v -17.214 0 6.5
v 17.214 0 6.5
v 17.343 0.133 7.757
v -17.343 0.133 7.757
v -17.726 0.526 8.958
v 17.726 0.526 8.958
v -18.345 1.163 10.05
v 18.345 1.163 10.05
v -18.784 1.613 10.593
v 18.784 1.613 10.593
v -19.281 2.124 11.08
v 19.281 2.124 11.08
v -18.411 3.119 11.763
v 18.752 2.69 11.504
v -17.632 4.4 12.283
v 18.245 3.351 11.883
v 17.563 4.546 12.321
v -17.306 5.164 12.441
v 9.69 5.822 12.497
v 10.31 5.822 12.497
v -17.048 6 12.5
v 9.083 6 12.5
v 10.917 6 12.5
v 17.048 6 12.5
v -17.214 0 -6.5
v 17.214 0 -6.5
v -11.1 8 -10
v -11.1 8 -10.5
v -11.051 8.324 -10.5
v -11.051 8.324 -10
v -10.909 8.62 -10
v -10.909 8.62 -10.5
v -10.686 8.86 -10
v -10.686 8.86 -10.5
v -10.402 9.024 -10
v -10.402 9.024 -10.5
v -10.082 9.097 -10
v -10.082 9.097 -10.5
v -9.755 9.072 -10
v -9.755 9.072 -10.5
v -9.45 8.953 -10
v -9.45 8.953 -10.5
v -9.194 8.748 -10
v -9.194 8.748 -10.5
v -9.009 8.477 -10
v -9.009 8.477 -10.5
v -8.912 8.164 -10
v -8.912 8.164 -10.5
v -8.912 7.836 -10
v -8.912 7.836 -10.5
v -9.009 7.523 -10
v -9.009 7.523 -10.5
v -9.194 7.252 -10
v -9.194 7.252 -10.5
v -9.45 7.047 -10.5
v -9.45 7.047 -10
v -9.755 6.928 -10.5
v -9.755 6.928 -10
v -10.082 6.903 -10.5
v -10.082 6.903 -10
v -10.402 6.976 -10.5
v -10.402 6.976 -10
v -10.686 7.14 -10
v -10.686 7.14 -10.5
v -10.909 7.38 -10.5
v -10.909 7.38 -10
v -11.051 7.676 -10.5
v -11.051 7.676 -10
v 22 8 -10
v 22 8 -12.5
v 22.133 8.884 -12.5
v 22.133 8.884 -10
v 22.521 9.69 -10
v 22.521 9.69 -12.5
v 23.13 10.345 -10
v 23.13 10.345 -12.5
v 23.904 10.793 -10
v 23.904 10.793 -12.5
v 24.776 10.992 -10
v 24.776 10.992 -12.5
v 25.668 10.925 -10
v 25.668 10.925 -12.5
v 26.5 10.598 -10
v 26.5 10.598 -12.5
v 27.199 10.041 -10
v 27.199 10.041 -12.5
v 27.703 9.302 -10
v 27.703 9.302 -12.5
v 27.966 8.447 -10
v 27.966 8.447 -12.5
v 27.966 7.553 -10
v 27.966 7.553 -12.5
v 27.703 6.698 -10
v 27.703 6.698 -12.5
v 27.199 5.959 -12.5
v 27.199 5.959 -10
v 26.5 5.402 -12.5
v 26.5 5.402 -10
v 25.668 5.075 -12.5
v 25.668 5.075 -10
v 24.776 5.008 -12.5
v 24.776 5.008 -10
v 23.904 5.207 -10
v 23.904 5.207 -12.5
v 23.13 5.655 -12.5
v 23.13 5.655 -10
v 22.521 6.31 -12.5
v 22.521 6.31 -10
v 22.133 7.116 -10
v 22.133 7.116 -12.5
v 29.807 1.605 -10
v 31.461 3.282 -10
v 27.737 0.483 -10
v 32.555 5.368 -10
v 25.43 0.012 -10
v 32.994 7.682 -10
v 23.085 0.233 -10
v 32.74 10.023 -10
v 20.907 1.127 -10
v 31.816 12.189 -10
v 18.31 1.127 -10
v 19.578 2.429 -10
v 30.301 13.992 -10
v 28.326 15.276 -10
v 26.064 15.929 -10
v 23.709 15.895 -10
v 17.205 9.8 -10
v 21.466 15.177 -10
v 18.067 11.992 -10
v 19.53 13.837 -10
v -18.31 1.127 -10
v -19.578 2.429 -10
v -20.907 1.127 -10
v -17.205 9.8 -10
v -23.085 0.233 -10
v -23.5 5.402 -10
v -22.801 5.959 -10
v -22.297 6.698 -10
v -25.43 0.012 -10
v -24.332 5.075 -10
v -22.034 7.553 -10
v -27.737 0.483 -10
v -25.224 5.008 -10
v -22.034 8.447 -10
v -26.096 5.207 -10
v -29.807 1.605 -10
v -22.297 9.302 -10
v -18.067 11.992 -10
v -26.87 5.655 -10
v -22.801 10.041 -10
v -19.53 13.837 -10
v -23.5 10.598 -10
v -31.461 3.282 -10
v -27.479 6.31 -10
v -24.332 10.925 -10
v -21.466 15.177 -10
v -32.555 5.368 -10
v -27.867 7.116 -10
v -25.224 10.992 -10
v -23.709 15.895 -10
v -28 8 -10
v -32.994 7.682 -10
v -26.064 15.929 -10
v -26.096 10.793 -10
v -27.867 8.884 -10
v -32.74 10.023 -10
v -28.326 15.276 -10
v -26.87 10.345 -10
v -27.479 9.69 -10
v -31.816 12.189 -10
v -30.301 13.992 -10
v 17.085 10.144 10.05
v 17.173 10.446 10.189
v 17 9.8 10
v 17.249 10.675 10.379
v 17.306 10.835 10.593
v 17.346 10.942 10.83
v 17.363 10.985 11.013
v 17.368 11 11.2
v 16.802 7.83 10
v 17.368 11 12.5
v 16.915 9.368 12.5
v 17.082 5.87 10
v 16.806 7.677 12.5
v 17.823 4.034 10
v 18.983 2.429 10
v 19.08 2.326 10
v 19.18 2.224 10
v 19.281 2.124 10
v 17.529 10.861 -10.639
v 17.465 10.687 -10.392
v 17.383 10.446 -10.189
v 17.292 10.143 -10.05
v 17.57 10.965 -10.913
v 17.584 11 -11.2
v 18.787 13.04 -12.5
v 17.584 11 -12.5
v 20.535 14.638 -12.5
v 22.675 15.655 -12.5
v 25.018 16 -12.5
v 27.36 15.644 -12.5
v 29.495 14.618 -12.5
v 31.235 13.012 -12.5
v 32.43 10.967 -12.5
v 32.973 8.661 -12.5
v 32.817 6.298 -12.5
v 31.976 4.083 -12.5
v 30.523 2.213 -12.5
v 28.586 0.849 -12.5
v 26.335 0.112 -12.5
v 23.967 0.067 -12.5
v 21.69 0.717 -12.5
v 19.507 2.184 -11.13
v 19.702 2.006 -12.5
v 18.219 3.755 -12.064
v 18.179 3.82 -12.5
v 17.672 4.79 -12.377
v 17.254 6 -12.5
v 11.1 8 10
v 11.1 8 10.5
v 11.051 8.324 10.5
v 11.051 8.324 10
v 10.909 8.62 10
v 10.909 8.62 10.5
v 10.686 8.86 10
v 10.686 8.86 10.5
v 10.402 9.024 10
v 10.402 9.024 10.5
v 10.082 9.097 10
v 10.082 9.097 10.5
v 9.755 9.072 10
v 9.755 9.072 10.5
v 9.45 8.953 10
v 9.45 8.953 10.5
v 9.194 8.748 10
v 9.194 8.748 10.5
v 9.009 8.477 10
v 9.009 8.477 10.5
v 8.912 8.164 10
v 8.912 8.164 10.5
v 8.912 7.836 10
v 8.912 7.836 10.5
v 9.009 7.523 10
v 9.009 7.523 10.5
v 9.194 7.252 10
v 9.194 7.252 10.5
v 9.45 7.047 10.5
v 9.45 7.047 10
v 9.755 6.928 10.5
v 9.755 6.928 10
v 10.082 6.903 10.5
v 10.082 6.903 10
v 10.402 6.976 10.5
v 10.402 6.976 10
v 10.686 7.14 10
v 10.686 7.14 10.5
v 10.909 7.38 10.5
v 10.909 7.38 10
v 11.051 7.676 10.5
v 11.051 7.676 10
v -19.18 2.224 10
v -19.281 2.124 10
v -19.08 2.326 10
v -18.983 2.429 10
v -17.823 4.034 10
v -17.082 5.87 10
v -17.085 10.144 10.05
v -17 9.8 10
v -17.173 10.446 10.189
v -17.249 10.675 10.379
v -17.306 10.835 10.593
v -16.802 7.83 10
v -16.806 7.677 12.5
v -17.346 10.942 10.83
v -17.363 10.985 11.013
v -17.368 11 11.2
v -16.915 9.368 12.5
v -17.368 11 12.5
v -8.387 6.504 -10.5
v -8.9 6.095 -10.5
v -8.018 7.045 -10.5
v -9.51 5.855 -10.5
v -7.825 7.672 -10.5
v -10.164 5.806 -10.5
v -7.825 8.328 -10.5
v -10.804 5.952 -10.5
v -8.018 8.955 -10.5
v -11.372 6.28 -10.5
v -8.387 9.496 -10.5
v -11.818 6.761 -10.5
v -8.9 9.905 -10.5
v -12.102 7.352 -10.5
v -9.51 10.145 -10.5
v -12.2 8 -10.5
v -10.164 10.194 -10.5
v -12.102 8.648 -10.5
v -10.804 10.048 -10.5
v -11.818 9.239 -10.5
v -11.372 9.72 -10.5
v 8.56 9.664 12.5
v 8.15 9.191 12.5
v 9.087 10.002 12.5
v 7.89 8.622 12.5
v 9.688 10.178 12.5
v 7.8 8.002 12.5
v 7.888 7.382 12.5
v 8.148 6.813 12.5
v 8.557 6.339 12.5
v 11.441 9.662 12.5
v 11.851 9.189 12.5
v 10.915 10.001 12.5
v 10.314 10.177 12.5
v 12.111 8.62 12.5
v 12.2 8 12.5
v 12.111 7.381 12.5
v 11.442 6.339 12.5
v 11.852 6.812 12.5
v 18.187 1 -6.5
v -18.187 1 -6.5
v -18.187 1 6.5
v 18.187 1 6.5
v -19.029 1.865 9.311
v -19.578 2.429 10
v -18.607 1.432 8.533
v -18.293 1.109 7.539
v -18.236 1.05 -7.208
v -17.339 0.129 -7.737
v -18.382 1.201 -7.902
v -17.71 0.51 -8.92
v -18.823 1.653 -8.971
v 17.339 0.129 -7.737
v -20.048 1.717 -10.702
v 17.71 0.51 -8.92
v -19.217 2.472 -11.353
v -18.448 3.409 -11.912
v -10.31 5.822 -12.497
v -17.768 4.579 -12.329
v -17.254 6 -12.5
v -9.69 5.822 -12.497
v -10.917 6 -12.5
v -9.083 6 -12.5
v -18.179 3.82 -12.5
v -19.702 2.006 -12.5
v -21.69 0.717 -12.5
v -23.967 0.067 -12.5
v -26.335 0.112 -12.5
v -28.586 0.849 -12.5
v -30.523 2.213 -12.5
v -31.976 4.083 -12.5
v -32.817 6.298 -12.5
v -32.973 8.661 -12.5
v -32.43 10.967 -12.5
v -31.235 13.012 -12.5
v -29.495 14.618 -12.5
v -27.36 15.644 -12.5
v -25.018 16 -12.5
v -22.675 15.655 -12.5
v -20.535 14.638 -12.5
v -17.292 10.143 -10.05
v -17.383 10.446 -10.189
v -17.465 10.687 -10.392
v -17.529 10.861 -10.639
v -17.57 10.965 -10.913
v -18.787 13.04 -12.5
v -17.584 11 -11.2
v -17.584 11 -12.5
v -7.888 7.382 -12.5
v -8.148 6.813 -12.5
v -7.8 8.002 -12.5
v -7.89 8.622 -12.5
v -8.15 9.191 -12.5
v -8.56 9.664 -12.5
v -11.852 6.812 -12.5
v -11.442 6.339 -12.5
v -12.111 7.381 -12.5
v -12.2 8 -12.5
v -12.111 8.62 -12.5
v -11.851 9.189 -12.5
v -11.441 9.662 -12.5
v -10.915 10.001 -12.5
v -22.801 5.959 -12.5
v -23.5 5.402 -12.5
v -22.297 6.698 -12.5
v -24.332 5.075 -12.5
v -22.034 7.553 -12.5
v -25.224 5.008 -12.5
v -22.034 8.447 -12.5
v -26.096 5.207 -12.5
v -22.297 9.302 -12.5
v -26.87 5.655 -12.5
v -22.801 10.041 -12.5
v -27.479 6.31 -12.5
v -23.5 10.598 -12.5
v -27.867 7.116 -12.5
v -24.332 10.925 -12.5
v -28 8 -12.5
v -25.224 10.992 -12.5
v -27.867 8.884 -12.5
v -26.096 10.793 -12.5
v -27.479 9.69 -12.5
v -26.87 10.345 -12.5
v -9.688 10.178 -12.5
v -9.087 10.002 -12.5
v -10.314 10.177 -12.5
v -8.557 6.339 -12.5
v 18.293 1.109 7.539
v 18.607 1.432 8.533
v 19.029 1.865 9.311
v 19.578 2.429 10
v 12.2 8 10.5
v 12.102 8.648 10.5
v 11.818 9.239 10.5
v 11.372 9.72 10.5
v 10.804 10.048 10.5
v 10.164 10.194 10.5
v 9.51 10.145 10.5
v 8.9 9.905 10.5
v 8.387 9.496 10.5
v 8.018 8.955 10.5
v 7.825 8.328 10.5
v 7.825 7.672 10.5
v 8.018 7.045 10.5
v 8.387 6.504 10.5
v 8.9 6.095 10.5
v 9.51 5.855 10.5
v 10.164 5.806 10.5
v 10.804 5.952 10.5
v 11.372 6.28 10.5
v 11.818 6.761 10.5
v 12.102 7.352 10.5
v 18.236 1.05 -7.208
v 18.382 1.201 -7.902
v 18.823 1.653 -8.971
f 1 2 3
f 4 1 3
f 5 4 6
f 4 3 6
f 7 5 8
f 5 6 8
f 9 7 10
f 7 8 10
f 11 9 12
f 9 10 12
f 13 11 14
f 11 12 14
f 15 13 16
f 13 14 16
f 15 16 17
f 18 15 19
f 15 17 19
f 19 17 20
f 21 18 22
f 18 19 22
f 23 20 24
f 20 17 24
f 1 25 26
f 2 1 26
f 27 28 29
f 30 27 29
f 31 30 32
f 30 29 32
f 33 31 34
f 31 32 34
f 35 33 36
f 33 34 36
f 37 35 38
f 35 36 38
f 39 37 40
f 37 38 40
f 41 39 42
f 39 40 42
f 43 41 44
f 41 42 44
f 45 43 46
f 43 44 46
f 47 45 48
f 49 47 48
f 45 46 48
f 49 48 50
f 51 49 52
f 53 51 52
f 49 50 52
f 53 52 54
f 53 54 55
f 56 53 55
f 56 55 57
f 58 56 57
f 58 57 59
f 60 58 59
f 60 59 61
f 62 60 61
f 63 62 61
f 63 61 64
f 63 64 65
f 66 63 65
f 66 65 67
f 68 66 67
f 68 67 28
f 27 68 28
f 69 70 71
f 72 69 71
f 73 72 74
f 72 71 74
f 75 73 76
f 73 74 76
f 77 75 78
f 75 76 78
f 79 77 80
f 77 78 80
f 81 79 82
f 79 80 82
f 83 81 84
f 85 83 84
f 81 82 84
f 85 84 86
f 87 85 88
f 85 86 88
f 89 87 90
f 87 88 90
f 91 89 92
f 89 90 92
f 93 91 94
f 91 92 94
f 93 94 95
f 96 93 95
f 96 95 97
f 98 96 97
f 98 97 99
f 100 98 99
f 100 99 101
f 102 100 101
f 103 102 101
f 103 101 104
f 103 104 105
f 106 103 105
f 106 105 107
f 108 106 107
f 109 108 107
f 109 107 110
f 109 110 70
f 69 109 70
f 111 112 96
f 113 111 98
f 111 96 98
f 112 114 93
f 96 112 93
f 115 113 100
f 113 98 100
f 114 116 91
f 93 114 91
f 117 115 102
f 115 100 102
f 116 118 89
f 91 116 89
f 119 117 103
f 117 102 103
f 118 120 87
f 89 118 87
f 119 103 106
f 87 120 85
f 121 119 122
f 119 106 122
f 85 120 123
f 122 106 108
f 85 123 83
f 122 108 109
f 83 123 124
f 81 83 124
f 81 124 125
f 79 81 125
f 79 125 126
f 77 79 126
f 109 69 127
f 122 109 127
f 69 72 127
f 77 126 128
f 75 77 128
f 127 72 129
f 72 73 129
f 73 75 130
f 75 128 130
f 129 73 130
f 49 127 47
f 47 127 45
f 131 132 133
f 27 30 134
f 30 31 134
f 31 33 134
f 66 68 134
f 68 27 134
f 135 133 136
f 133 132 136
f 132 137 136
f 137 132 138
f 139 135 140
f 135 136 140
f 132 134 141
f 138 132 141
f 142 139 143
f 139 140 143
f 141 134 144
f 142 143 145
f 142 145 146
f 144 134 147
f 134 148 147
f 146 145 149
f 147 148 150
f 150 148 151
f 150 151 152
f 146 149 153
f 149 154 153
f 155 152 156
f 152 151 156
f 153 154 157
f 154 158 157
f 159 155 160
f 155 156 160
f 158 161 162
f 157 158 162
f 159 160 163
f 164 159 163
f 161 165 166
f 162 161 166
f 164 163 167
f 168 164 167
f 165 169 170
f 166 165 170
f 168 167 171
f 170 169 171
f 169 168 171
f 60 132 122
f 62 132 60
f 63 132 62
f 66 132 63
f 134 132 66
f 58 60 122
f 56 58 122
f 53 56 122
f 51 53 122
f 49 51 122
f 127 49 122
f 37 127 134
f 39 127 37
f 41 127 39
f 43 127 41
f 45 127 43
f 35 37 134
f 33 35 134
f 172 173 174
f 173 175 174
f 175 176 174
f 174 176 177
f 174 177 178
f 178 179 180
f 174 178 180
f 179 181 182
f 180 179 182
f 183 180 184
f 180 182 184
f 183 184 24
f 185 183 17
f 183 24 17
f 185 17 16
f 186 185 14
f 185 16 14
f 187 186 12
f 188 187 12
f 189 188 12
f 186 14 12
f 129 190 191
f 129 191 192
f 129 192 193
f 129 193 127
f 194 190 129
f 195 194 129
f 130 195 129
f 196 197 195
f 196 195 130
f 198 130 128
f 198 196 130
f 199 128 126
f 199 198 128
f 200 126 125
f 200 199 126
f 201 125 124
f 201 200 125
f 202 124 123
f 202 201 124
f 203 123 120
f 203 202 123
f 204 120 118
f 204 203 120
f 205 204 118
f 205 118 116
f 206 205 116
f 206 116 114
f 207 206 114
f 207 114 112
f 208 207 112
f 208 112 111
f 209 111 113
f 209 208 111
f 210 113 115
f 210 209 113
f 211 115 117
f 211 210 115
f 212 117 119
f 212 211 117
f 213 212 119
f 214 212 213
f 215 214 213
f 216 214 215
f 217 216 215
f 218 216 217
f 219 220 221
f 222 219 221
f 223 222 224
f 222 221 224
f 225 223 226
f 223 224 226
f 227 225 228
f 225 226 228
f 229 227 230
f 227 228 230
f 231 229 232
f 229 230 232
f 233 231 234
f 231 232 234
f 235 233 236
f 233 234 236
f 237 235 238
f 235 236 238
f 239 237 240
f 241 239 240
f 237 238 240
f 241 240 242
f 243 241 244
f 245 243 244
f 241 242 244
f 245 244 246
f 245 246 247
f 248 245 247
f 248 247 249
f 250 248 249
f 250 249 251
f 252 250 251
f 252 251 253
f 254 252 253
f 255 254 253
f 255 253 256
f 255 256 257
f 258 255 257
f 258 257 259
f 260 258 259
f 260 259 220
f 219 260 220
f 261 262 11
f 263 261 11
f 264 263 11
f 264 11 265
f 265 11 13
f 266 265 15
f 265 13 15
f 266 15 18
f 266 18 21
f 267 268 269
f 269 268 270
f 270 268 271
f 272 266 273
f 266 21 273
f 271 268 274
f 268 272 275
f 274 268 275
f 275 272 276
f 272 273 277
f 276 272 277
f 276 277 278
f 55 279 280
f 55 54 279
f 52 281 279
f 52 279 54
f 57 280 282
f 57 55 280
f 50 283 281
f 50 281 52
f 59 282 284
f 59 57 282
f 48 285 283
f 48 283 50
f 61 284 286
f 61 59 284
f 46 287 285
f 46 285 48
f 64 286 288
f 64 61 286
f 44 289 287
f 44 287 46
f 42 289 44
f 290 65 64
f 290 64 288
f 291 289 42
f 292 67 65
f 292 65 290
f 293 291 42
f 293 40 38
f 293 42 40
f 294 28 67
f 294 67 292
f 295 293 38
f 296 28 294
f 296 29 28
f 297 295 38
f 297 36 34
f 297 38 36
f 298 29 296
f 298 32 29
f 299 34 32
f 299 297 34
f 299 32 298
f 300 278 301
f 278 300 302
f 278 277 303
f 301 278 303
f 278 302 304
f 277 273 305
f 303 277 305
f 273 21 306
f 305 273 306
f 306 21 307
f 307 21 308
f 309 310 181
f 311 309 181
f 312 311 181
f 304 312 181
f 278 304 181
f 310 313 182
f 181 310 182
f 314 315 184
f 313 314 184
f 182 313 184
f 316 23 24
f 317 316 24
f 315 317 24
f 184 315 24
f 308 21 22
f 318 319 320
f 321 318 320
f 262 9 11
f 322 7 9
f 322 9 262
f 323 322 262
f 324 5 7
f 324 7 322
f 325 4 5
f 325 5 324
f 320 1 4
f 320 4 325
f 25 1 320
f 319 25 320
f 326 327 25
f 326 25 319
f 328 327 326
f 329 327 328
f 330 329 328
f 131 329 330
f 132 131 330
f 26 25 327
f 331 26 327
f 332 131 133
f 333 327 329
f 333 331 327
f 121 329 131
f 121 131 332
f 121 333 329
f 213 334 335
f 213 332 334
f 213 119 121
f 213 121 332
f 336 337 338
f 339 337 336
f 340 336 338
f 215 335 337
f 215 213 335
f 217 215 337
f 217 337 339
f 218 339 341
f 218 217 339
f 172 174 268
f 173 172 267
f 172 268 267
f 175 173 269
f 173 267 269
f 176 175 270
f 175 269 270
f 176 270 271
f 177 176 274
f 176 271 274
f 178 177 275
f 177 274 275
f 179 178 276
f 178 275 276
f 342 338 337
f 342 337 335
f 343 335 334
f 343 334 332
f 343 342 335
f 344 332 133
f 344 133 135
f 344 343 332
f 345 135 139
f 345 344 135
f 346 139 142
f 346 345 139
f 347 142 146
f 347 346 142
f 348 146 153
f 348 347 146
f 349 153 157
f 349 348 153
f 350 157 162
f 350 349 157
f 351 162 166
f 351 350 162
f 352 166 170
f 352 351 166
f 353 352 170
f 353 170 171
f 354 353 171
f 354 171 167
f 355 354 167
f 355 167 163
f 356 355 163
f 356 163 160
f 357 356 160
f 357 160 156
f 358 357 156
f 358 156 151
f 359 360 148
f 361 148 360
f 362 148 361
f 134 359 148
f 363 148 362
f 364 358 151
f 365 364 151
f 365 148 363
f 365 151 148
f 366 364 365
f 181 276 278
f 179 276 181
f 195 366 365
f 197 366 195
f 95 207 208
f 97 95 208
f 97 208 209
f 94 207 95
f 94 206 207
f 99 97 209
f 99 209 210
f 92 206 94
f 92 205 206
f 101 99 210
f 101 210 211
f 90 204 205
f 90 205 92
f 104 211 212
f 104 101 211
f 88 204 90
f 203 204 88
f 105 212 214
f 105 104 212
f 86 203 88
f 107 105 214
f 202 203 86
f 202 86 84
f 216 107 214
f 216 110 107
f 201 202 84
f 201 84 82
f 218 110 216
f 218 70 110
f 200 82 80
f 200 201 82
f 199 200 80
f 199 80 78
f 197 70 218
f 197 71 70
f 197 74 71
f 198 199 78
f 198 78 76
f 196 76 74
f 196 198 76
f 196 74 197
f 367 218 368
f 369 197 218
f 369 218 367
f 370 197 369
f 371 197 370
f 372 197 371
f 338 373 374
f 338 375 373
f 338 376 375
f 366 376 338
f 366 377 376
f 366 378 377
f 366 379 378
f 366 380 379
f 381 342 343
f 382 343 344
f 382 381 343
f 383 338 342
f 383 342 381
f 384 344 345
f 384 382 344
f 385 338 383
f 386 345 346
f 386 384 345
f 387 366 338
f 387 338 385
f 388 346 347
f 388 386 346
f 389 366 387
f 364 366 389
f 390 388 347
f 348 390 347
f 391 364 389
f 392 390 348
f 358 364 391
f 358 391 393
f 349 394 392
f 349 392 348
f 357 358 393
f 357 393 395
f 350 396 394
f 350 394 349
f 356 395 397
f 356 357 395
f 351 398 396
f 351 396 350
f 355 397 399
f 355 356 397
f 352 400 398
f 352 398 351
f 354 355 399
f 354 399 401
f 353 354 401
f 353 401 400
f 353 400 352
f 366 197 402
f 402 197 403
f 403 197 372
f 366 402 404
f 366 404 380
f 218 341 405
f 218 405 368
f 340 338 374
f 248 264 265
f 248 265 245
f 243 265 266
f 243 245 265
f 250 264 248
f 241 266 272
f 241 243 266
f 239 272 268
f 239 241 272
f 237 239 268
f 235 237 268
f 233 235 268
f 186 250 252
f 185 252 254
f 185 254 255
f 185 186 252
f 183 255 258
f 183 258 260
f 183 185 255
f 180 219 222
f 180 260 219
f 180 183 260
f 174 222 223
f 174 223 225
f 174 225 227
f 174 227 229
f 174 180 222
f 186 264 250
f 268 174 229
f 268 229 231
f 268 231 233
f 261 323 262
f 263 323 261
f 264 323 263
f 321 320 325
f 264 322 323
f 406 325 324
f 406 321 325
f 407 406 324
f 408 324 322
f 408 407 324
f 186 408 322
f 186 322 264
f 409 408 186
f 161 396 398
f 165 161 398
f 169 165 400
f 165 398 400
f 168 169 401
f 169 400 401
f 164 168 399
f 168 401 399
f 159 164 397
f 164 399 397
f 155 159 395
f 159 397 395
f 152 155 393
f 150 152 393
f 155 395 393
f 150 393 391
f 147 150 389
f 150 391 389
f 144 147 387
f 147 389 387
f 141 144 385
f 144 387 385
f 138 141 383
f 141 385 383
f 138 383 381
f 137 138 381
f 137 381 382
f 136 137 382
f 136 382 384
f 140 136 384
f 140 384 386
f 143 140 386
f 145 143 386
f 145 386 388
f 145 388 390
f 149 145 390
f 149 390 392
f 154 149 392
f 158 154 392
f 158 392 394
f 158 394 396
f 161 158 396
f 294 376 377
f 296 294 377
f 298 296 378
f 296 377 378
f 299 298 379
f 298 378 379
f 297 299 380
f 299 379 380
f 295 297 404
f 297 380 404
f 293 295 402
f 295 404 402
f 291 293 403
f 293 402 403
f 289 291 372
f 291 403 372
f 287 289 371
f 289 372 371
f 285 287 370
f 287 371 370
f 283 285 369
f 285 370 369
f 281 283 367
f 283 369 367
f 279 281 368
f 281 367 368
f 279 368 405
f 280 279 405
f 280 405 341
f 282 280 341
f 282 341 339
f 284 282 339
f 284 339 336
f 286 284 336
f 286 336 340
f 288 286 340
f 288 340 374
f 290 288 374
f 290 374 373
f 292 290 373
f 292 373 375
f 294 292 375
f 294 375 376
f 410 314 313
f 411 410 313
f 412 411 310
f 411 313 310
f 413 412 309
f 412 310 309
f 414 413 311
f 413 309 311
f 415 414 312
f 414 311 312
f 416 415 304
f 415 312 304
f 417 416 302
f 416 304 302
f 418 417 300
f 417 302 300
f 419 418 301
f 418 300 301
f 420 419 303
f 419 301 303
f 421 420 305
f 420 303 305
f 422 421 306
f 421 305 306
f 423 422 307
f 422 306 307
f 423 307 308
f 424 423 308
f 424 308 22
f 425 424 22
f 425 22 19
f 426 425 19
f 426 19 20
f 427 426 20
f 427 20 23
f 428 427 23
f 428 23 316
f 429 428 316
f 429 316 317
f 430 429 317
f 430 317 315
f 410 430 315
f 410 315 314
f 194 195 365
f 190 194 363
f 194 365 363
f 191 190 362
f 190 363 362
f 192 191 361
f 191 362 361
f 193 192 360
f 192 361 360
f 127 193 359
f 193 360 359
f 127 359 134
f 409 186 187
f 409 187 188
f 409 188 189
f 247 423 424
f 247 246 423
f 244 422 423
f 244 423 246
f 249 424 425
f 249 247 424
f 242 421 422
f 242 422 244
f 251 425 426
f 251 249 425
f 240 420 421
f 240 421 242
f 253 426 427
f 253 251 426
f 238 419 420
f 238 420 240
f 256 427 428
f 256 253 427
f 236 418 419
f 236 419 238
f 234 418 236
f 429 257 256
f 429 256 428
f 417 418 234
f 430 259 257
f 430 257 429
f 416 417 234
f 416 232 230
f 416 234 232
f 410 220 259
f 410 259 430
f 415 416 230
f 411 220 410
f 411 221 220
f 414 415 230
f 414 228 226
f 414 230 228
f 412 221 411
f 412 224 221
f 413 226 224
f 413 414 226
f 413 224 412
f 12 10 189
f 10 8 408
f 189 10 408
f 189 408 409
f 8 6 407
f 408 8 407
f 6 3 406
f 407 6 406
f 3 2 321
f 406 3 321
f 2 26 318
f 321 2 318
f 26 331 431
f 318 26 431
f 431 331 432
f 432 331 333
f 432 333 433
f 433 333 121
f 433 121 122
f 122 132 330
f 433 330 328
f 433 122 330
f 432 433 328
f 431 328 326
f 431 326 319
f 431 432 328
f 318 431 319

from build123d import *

# Parameters (mm, degrees)
SKETCH_1_W          = 50
SKETCH_1_H          = 25
EXTRUDE_1_DEPTH     = 11
CUT_EXTRUDE_1_DEPTH = 53.699620492
CUT_EXTRUDE_2_DEPTH = 53.699620492
SKETCH_6_R          = 8
EXTRUDE_4_DEPTH     = 2.5
SKETCH_9_R          = 3
SKETCH_9_R_2        = 1.1
CUT_EXTRUDE_4_DEPTH = 2.5
SKETCH_12_R         = 2.2
CUT_EXTRUDE_5_DEPTH = 2
SKETCH_11_R         = 2.2
CUT_EXTRUDE_6_DEPTH = 2
SKETCH_13_R         = 8.2
CUT_EXTRUDE_7_DEPTH = 2.5
SKETCH_14_R         = 3
SKETCH_14_R_2       = 1.1
CUT_EXTRUDE_8_DEPTH = 2.5
CUT_EXTRUDE_9_DEPTH = 25
FILLET_1_R          = 1.2


with BuildPart() as part:
    # 草图1 → 凸台-拉伸1 (new body)
    with BuildSketch(Plane(origin=(0, 0, 0), x_dir=(1, 0, 0), z_dir=(0, 1, 0))):
        Rectangle(SKETCH_1_W, SKETCH_1_H)
    extrude(amount=EXTRUDE_1_DEPTH)

    # 草图2 → 切除-拉伸1 (cut, through all)
    with BuildSketch(Plane(origin=(25, 0, 0), x_dir=(0, 0, -1), z_dir=(1, 0, 0))):
        with BuildLine():
            Line((-12.5, 0), (-6.5, 0))
            ThreePointArc((-6.5, 0), (-10.742640687, 1.757359313), (-12.5, 6))
            Line((-12.5, 6), (-12.5, 0))
        make_face()
        with BuildLine():
            Line((12.5, 6), (12.5, 0))
            Line((12.5, 0), (6.5, 0))
            ThreePointArc((6.5, 0), (10.742640687, 1.757359313), (12.5, 6))
        make_face()
    extrude(amount=-CUT_EXTRUDE_1_DEPTH, mode=Mode.SUBTRACT)

    # 草图3 → 切除-拉伸2 (cut, through all)
    with BuildSketch(Plane(origin=(25, 0, 0), x_dir=(0, 0, -1), z_dir=(1, 0, 0))):
        with BuildLine():
            Line((-10, 11), (10, 11))
            Line((10, 11), (10, 2.429285786))
            ThreePointArc((10, 2.429285786), (8.390294809, 1.371092404), (6.5, 1))
            Line((6.5, 1), (-6.5, 1))
            ThreePointArc((-6.5, 1), (-8.390294809, 1.371092404), (-10, 2.429285786))
            Line((-10, 2.429285786), (-10, 11))
        make_face()
    extrude(amount=-CUT_EXTRUDE_2_DEPTH, mode=Mode.SUBTRACT)

    # 草图6 → 凸台-拉伸4 (add)
    with BuildSketch(Plane(origin=(0, 0, -12.5), x_dir=(-1, 0, 0), z_dir=(0, 0, -1))):
        with Locations((25, 8)):
            Circle(SKETCH_6_R)
        with Locations((-25, 8)):
            Circle(SKETCH_6_R)
    extrude(amount=-EXTRUDE_4_DEPTH)

    # 草图9 → 切除-拉伸4 (cut)
    with BuildSketch(Plane.XY.offset(12.5)):
        with Locations((25, 8)):
            Circle(SKETCH_9_R)
        with Locations((10, 8)):
            Circle(SKETCH_9_R_2)
    extrude(amount=-CUT_EXTRUDE_4_DEPTH, mode=Mode.SUBTRACT)

    # 草图12 → 切除-拉伸5 (cut)
    with BuildSketch(Plane.XY.offset(12.5)):
        with Locations((10, 8)):
            Circle(SKETCH_12_R)
    extrude(amount=-CUT_EXTRUDE_5_DEPTH, mode=Mode.SUBTRACT)

    # 草图11 → 切除-拉伸6 (cut)
    with BuildSketch(Plane(origin=(0, 0, -12.5), x_dir=(-1, 0, 0), z_dir=(0, 0, -1))):
        with Locations((10, 8)):
            Circle(SKETCH_11_R)
    extrude(amount=-CUT_EXTRUDE_6_DEPTH, mode=Mode.SUBTRACT)

    # 草图13 → 切除-拉伸7 (cut)
    with BuildSketch(Plane.XY.offset(12.5)):
        with Locations((-25, 8)):
            Circle(SKETCH_13_R)
        with Locations((25, 8)):
            Circle(SKETCH_13_R)
    extrude(amount=-CUT_EXTRUDE_7_DEPTH, mode=Mode.SUBTRACT)

    # 草图14 → 切除-拉伸8 (cut)
    with BuildSketch(Plane(origin=(0, 0, -12.5), x_dir=(-1, 0, 0), z_dir=(0, 0, -1))):
        with Locations((25, 8)):
            Circle(SKETCH_14_R)
        with Locations((-25, 8)):
            Circle(SKETCH_14_R)
        with Locations((10, 8)):
            Circle(SKETCH_14_R_2)
    extrude(amount=-CUT_EXTRUDE_8_DEPTH, mode=Mode.SUBTRACT)

    # 草图15 → 切除-拉伸9 (cut)
    with BuildSketch(Plane.XY.offset(-10)):
        Polygon((25, 8), (25, 0), (17.002930857, -0.216529728), align=None)
        Polygon((-17.002930857, -0.216529728), (-25, 8), (-25, 0), align=None)
    extrude(amount=CUT_EXTRUDE_9_DEPTH, mode=Mode.SUBTRACT)

    # 圆角1
    fillet_1_edges = [part.edges().sort_by_distance(p)[0] for p in [
        (0, 11, 10),
        (0, 11, -10),
    ]]
    fillet(fillet_1_edges, radius=FILLET_1_R)


solid = part.part
